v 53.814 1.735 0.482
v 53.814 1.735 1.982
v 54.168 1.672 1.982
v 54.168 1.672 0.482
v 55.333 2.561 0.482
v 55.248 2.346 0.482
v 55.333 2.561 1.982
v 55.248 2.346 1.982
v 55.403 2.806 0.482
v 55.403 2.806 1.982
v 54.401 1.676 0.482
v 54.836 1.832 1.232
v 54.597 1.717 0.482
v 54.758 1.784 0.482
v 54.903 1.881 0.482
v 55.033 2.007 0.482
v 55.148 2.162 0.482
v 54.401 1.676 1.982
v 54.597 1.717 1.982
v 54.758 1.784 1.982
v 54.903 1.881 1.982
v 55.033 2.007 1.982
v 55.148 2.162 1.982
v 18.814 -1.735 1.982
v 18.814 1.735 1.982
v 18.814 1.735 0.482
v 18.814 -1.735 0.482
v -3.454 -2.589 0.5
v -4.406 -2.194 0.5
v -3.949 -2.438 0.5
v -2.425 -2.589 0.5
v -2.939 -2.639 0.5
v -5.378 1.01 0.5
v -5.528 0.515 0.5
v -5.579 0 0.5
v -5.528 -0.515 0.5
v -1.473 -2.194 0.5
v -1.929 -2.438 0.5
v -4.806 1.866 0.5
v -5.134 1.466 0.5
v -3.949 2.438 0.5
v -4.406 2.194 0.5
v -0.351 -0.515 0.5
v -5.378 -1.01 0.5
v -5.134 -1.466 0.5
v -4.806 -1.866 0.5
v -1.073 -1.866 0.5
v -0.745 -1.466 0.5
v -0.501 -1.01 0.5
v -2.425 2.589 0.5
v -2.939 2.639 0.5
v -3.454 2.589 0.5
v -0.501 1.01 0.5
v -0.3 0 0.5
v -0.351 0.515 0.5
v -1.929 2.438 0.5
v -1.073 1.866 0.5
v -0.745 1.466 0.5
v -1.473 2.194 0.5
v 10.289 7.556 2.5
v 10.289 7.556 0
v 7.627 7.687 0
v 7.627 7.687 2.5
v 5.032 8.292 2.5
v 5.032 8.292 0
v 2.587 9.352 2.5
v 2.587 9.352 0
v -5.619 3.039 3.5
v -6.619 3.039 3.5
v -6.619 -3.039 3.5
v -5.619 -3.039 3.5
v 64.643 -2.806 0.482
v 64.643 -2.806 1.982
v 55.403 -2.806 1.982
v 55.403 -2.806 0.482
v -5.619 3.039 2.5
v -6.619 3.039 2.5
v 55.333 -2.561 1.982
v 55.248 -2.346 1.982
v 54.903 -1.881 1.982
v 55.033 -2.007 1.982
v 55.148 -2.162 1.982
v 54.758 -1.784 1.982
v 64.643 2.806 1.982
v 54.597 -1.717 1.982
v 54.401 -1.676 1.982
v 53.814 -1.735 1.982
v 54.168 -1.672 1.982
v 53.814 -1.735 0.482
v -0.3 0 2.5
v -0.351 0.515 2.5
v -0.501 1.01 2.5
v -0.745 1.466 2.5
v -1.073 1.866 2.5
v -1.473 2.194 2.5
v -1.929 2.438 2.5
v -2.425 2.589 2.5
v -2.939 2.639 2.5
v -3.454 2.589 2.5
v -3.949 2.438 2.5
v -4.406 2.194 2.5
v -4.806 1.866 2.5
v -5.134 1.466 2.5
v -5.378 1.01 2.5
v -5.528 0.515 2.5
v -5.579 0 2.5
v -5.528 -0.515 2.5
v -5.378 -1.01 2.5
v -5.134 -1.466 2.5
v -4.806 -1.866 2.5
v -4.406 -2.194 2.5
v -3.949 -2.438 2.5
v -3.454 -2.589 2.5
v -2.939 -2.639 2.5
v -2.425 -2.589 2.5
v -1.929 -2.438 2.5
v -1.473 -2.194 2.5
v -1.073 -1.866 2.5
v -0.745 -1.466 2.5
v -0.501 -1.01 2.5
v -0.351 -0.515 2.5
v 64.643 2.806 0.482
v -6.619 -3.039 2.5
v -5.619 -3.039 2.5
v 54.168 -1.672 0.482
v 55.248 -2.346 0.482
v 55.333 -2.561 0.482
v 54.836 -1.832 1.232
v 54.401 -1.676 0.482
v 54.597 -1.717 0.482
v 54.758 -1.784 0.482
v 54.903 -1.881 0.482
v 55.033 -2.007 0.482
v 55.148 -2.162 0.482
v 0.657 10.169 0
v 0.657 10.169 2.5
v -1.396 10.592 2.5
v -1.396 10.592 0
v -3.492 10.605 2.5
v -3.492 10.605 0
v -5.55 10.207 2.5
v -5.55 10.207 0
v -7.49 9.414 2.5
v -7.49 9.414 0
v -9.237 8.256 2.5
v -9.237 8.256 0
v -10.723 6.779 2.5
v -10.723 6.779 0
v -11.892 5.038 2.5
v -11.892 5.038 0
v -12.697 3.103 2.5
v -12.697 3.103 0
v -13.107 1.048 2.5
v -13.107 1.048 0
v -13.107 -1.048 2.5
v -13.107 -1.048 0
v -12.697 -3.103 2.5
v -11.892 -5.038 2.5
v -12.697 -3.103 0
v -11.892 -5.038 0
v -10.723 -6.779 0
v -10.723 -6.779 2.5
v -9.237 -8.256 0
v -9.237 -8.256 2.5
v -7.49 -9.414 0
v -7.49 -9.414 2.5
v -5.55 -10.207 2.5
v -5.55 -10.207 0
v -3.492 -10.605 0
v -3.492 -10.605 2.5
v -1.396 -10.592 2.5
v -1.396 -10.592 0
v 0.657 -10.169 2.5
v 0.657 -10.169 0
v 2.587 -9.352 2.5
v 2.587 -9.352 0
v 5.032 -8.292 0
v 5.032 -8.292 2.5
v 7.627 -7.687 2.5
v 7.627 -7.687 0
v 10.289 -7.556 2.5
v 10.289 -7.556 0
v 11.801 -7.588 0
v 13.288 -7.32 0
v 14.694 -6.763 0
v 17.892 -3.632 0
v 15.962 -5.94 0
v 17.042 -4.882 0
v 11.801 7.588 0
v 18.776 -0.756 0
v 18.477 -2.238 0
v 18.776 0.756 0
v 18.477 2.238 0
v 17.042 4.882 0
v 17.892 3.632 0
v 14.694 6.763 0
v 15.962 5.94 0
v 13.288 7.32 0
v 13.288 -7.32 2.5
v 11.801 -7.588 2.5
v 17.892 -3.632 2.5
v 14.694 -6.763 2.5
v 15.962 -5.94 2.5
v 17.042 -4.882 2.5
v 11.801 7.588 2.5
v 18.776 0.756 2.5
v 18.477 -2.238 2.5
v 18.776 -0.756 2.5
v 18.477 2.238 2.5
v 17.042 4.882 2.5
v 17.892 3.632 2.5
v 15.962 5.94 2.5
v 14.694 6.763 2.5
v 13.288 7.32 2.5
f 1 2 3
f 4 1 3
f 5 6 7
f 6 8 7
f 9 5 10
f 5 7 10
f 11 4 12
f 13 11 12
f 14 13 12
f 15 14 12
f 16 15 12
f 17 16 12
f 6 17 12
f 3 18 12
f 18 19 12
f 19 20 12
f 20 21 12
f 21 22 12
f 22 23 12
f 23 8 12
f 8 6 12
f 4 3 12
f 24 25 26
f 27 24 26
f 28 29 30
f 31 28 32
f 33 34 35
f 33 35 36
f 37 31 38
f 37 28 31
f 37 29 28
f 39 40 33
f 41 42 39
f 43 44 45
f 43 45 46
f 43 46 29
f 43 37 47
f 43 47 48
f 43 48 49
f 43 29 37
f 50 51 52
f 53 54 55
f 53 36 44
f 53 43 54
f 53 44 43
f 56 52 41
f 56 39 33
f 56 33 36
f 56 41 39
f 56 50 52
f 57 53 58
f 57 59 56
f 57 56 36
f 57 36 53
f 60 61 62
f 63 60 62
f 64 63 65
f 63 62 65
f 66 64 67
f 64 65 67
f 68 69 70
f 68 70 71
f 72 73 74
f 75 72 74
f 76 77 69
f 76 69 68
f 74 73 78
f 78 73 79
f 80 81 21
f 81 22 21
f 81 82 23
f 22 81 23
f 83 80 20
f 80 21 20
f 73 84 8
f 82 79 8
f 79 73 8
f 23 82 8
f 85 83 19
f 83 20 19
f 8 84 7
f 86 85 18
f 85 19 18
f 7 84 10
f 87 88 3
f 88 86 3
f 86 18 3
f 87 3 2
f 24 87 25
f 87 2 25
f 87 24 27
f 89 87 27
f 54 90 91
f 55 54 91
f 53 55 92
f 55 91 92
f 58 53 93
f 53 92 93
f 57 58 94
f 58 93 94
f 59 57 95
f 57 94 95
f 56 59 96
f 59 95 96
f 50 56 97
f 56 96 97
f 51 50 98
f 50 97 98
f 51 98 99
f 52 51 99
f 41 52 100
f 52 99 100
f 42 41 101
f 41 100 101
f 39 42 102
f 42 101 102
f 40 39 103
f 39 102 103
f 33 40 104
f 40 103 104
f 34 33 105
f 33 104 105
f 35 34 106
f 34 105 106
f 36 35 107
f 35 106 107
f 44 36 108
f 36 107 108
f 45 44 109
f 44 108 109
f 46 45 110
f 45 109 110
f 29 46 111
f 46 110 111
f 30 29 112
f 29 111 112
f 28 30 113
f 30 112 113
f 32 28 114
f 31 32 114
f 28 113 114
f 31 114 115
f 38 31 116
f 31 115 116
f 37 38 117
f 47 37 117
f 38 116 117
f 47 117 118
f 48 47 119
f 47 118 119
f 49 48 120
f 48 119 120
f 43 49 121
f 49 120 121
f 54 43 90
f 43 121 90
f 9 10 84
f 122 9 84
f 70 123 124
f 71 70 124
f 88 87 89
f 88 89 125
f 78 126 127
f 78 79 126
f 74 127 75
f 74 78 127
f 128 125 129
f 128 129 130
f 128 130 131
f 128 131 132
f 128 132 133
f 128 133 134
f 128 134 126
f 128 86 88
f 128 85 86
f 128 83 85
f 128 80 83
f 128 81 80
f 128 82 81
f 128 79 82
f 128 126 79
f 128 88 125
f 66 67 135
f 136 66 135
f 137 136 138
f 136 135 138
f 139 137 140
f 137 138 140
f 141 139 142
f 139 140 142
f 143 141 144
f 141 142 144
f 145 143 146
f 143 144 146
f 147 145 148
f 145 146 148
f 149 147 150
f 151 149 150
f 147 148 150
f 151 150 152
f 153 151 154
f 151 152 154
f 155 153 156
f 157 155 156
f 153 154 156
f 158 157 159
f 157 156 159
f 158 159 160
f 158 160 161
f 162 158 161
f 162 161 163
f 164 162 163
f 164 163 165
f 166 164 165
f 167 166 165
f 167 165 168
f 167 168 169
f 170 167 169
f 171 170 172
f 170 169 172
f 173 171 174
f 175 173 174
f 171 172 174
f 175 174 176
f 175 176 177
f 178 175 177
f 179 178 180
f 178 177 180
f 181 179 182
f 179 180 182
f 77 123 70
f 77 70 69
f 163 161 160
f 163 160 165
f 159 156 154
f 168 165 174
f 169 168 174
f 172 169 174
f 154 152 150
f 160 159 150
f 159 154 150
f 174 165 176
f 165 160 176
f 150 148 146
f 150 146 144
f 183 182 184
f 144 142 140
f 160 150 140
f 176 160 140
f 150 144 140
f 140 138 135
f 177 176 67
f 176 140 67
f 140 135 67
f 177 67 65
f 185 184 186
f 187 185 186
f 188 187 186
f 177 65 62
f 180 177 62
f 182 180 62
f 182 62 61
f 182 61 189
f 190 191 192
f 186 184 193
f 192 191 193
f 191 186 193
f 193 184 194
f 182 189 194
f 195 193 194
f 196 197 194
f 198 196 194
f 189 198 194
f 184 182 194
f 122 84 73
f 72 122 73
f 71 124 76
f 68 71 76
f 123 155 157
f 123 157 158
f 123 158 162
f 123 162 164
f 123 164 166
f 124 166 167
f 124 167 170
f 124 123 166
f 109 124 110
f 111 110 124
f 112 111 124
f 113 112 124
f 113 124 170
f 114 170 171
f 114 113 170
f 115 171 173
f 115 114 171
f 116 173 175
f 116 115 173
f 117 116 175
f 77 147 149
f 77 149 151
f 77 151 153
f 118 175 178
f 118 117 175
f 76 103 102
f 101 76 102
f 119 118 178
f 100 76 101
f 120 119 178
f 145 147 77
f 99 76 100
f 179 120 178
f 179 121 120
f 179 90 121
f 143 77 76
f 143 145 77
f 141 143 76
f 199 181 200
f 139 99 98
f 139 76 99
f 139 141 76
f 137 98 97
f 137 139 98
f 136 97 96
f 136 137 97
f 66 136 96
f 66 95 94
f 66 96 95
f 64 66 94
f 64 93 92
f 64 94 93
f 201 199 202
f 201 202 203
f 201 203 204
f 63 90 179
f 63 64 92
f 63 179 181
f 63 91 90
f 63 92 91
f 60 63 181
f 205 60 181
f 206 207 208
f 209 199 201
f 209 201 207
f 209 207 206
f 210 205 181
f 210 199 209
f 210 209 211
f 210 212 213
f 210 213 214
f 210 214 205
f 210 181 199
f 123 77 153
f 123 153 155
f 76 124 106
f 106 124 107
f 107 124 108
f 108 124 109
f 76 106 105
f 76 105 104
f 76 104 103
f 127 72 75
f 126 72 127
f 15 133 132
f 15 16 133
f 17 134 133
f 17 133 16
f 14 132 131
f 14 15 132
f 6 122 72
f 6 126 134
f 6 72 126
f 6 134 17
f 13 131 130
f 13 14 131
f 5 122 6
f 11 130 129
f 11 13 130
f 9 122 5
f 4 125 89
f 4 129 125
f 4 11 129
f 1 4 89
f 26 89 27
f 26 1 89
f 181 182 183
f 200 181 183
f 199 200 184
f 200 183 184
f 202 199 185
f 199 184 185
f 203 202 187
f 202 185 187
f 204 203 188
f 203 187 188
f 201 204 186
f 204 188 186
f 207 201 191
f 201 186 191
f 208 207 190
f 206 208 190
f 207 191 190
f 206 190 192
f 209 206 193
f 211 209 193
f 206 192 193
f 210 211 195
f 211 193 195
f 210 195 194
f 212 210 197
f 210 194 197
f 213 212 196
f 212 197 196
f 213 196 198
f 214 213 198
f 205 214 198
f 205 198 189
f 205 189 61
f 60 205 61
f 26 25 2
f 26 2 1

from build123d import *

# Parameters (mm, degrees)
BOSS_EXTRUDE1_DEPTH = 5
SKETCH2_R           = 5.278550586
CUT_EXTRUDE1_DEPTH  = 4
SKETCH3_W           = 2
SKETCH3_H           = 12.154507728
BOSS_EXTRUDE2_DEPTH = 2
SKETCH4_W           = 3
SKETCH4_H           = 6.940968586
BOSS_EXTRUDE3_DEPTH = 70
BOSS_EXTRUDE4_DEPTH = 3
SCALE4_SCALE        = 0.5


with BuildPart() as part:
    # Sketch1 → Boss-Extrude1 (new body)
    with BuildSketch(Plane.XY):
        with BuildLine():
            ThreePointArc((5.174427841, 18.704119042), (-26.317863295, 0), (5.174427841, -18.704119042))
            ThreePointArc((5.174427841, -18.704119042), (12.632543097, -15.862864713), (20.57819755, -15.112674975))
            ThreePointArc((20.57819755, -15.112674975), (37.627690387, 0), (20.57819755, 15.112674975))
            ThreePointArc((20.57819755, 15.112674975), (12.632543097, 15.862864713), (5.174427841, 18.704119042))
        make_face()
    extrude(amount=BOSS_EXTRUDE1_DEPTH)

    # Sketch2 → Cut-Extrude1 (cut)
    with BuildSketch(Plane.XY.offset(5)):
        with Locations((-5.878799432, 0)):
            Circle(SKETCH2_R)
    extrude(amount=-CUT_EXTRUDE1_DEPTH, mode=Mode.SUBTRACT)

    # Sketch3 → Boss-Extrude2 (add)
    with BuildSketch(Plane.XY.offset(5)):
        with Locations((-12.237238322, 0)):
            Rectangle(SKETCH3_W, SKETCH3_H)
    extrude(amount=BOSS_EXTRUDE2_DEPTH)


with BuildPart() as body_2:
    # Sketch4 → Boss-Extrude3 (new body)
    with BuildSketch(Plane(origin=(37.627690387, 0, 0), x_dir=(0, 0, -1), z_dir=(1, 0, 0))):
        with Locations((-2.464797003, 0)):
            Rectangle(SKETCH4_W, SKETCH4_H)
    extrude(amount=BOSS_EXTRUDE3_DEPTH)

    # Sketch5 → Boss-Extrude4 (add)
    with BuildSketch(Plane.XY.offset(3.964797003)):
        with BuildLine():
            Line((110.806298468, 5.612110794), (129.285199862, 5.612110794))
            Line((129.285199862, 5.612110794), (129.285199862, -5.612110794))
            Line((129.285199862, -5.612110794), (110.806298468, -5.612110794))
            add(Edge.make_bspline(
                [(107.627690387, -3.470484293), (110.128503365, -2.786214219), (110.806298468, -5.612110794)],
                knots=[0, 0, 0, 1, 1, 1], degree=2))
            Line((107.627690387, -3.470484293), (107.627690387, 3.470484293))
            add(Edge.make_bspline(
                [(107.627690387, 3.470484293), (110.128503365, 2.786214219), (110.806298468, 5.612110794)],
                knots=[0, 0, 0, 1, 1, 1], degree=2))
        make_face()
    extrude(amount=-BOSS_EXTRUDE4_DEPTH)


with BuildPart() as part_1:
    # Scale4: scaled about (0, 0, 0)
    add(part.part.scale(SCALE4_SCALE))


with BuildPart() as body_2_1:
    # Scale4: scaled about (0, 0, 0)
    add(body_2.part.scale(SCALE4_SCALE))


solid = Compound([part_1.part, body_2_1.part])
